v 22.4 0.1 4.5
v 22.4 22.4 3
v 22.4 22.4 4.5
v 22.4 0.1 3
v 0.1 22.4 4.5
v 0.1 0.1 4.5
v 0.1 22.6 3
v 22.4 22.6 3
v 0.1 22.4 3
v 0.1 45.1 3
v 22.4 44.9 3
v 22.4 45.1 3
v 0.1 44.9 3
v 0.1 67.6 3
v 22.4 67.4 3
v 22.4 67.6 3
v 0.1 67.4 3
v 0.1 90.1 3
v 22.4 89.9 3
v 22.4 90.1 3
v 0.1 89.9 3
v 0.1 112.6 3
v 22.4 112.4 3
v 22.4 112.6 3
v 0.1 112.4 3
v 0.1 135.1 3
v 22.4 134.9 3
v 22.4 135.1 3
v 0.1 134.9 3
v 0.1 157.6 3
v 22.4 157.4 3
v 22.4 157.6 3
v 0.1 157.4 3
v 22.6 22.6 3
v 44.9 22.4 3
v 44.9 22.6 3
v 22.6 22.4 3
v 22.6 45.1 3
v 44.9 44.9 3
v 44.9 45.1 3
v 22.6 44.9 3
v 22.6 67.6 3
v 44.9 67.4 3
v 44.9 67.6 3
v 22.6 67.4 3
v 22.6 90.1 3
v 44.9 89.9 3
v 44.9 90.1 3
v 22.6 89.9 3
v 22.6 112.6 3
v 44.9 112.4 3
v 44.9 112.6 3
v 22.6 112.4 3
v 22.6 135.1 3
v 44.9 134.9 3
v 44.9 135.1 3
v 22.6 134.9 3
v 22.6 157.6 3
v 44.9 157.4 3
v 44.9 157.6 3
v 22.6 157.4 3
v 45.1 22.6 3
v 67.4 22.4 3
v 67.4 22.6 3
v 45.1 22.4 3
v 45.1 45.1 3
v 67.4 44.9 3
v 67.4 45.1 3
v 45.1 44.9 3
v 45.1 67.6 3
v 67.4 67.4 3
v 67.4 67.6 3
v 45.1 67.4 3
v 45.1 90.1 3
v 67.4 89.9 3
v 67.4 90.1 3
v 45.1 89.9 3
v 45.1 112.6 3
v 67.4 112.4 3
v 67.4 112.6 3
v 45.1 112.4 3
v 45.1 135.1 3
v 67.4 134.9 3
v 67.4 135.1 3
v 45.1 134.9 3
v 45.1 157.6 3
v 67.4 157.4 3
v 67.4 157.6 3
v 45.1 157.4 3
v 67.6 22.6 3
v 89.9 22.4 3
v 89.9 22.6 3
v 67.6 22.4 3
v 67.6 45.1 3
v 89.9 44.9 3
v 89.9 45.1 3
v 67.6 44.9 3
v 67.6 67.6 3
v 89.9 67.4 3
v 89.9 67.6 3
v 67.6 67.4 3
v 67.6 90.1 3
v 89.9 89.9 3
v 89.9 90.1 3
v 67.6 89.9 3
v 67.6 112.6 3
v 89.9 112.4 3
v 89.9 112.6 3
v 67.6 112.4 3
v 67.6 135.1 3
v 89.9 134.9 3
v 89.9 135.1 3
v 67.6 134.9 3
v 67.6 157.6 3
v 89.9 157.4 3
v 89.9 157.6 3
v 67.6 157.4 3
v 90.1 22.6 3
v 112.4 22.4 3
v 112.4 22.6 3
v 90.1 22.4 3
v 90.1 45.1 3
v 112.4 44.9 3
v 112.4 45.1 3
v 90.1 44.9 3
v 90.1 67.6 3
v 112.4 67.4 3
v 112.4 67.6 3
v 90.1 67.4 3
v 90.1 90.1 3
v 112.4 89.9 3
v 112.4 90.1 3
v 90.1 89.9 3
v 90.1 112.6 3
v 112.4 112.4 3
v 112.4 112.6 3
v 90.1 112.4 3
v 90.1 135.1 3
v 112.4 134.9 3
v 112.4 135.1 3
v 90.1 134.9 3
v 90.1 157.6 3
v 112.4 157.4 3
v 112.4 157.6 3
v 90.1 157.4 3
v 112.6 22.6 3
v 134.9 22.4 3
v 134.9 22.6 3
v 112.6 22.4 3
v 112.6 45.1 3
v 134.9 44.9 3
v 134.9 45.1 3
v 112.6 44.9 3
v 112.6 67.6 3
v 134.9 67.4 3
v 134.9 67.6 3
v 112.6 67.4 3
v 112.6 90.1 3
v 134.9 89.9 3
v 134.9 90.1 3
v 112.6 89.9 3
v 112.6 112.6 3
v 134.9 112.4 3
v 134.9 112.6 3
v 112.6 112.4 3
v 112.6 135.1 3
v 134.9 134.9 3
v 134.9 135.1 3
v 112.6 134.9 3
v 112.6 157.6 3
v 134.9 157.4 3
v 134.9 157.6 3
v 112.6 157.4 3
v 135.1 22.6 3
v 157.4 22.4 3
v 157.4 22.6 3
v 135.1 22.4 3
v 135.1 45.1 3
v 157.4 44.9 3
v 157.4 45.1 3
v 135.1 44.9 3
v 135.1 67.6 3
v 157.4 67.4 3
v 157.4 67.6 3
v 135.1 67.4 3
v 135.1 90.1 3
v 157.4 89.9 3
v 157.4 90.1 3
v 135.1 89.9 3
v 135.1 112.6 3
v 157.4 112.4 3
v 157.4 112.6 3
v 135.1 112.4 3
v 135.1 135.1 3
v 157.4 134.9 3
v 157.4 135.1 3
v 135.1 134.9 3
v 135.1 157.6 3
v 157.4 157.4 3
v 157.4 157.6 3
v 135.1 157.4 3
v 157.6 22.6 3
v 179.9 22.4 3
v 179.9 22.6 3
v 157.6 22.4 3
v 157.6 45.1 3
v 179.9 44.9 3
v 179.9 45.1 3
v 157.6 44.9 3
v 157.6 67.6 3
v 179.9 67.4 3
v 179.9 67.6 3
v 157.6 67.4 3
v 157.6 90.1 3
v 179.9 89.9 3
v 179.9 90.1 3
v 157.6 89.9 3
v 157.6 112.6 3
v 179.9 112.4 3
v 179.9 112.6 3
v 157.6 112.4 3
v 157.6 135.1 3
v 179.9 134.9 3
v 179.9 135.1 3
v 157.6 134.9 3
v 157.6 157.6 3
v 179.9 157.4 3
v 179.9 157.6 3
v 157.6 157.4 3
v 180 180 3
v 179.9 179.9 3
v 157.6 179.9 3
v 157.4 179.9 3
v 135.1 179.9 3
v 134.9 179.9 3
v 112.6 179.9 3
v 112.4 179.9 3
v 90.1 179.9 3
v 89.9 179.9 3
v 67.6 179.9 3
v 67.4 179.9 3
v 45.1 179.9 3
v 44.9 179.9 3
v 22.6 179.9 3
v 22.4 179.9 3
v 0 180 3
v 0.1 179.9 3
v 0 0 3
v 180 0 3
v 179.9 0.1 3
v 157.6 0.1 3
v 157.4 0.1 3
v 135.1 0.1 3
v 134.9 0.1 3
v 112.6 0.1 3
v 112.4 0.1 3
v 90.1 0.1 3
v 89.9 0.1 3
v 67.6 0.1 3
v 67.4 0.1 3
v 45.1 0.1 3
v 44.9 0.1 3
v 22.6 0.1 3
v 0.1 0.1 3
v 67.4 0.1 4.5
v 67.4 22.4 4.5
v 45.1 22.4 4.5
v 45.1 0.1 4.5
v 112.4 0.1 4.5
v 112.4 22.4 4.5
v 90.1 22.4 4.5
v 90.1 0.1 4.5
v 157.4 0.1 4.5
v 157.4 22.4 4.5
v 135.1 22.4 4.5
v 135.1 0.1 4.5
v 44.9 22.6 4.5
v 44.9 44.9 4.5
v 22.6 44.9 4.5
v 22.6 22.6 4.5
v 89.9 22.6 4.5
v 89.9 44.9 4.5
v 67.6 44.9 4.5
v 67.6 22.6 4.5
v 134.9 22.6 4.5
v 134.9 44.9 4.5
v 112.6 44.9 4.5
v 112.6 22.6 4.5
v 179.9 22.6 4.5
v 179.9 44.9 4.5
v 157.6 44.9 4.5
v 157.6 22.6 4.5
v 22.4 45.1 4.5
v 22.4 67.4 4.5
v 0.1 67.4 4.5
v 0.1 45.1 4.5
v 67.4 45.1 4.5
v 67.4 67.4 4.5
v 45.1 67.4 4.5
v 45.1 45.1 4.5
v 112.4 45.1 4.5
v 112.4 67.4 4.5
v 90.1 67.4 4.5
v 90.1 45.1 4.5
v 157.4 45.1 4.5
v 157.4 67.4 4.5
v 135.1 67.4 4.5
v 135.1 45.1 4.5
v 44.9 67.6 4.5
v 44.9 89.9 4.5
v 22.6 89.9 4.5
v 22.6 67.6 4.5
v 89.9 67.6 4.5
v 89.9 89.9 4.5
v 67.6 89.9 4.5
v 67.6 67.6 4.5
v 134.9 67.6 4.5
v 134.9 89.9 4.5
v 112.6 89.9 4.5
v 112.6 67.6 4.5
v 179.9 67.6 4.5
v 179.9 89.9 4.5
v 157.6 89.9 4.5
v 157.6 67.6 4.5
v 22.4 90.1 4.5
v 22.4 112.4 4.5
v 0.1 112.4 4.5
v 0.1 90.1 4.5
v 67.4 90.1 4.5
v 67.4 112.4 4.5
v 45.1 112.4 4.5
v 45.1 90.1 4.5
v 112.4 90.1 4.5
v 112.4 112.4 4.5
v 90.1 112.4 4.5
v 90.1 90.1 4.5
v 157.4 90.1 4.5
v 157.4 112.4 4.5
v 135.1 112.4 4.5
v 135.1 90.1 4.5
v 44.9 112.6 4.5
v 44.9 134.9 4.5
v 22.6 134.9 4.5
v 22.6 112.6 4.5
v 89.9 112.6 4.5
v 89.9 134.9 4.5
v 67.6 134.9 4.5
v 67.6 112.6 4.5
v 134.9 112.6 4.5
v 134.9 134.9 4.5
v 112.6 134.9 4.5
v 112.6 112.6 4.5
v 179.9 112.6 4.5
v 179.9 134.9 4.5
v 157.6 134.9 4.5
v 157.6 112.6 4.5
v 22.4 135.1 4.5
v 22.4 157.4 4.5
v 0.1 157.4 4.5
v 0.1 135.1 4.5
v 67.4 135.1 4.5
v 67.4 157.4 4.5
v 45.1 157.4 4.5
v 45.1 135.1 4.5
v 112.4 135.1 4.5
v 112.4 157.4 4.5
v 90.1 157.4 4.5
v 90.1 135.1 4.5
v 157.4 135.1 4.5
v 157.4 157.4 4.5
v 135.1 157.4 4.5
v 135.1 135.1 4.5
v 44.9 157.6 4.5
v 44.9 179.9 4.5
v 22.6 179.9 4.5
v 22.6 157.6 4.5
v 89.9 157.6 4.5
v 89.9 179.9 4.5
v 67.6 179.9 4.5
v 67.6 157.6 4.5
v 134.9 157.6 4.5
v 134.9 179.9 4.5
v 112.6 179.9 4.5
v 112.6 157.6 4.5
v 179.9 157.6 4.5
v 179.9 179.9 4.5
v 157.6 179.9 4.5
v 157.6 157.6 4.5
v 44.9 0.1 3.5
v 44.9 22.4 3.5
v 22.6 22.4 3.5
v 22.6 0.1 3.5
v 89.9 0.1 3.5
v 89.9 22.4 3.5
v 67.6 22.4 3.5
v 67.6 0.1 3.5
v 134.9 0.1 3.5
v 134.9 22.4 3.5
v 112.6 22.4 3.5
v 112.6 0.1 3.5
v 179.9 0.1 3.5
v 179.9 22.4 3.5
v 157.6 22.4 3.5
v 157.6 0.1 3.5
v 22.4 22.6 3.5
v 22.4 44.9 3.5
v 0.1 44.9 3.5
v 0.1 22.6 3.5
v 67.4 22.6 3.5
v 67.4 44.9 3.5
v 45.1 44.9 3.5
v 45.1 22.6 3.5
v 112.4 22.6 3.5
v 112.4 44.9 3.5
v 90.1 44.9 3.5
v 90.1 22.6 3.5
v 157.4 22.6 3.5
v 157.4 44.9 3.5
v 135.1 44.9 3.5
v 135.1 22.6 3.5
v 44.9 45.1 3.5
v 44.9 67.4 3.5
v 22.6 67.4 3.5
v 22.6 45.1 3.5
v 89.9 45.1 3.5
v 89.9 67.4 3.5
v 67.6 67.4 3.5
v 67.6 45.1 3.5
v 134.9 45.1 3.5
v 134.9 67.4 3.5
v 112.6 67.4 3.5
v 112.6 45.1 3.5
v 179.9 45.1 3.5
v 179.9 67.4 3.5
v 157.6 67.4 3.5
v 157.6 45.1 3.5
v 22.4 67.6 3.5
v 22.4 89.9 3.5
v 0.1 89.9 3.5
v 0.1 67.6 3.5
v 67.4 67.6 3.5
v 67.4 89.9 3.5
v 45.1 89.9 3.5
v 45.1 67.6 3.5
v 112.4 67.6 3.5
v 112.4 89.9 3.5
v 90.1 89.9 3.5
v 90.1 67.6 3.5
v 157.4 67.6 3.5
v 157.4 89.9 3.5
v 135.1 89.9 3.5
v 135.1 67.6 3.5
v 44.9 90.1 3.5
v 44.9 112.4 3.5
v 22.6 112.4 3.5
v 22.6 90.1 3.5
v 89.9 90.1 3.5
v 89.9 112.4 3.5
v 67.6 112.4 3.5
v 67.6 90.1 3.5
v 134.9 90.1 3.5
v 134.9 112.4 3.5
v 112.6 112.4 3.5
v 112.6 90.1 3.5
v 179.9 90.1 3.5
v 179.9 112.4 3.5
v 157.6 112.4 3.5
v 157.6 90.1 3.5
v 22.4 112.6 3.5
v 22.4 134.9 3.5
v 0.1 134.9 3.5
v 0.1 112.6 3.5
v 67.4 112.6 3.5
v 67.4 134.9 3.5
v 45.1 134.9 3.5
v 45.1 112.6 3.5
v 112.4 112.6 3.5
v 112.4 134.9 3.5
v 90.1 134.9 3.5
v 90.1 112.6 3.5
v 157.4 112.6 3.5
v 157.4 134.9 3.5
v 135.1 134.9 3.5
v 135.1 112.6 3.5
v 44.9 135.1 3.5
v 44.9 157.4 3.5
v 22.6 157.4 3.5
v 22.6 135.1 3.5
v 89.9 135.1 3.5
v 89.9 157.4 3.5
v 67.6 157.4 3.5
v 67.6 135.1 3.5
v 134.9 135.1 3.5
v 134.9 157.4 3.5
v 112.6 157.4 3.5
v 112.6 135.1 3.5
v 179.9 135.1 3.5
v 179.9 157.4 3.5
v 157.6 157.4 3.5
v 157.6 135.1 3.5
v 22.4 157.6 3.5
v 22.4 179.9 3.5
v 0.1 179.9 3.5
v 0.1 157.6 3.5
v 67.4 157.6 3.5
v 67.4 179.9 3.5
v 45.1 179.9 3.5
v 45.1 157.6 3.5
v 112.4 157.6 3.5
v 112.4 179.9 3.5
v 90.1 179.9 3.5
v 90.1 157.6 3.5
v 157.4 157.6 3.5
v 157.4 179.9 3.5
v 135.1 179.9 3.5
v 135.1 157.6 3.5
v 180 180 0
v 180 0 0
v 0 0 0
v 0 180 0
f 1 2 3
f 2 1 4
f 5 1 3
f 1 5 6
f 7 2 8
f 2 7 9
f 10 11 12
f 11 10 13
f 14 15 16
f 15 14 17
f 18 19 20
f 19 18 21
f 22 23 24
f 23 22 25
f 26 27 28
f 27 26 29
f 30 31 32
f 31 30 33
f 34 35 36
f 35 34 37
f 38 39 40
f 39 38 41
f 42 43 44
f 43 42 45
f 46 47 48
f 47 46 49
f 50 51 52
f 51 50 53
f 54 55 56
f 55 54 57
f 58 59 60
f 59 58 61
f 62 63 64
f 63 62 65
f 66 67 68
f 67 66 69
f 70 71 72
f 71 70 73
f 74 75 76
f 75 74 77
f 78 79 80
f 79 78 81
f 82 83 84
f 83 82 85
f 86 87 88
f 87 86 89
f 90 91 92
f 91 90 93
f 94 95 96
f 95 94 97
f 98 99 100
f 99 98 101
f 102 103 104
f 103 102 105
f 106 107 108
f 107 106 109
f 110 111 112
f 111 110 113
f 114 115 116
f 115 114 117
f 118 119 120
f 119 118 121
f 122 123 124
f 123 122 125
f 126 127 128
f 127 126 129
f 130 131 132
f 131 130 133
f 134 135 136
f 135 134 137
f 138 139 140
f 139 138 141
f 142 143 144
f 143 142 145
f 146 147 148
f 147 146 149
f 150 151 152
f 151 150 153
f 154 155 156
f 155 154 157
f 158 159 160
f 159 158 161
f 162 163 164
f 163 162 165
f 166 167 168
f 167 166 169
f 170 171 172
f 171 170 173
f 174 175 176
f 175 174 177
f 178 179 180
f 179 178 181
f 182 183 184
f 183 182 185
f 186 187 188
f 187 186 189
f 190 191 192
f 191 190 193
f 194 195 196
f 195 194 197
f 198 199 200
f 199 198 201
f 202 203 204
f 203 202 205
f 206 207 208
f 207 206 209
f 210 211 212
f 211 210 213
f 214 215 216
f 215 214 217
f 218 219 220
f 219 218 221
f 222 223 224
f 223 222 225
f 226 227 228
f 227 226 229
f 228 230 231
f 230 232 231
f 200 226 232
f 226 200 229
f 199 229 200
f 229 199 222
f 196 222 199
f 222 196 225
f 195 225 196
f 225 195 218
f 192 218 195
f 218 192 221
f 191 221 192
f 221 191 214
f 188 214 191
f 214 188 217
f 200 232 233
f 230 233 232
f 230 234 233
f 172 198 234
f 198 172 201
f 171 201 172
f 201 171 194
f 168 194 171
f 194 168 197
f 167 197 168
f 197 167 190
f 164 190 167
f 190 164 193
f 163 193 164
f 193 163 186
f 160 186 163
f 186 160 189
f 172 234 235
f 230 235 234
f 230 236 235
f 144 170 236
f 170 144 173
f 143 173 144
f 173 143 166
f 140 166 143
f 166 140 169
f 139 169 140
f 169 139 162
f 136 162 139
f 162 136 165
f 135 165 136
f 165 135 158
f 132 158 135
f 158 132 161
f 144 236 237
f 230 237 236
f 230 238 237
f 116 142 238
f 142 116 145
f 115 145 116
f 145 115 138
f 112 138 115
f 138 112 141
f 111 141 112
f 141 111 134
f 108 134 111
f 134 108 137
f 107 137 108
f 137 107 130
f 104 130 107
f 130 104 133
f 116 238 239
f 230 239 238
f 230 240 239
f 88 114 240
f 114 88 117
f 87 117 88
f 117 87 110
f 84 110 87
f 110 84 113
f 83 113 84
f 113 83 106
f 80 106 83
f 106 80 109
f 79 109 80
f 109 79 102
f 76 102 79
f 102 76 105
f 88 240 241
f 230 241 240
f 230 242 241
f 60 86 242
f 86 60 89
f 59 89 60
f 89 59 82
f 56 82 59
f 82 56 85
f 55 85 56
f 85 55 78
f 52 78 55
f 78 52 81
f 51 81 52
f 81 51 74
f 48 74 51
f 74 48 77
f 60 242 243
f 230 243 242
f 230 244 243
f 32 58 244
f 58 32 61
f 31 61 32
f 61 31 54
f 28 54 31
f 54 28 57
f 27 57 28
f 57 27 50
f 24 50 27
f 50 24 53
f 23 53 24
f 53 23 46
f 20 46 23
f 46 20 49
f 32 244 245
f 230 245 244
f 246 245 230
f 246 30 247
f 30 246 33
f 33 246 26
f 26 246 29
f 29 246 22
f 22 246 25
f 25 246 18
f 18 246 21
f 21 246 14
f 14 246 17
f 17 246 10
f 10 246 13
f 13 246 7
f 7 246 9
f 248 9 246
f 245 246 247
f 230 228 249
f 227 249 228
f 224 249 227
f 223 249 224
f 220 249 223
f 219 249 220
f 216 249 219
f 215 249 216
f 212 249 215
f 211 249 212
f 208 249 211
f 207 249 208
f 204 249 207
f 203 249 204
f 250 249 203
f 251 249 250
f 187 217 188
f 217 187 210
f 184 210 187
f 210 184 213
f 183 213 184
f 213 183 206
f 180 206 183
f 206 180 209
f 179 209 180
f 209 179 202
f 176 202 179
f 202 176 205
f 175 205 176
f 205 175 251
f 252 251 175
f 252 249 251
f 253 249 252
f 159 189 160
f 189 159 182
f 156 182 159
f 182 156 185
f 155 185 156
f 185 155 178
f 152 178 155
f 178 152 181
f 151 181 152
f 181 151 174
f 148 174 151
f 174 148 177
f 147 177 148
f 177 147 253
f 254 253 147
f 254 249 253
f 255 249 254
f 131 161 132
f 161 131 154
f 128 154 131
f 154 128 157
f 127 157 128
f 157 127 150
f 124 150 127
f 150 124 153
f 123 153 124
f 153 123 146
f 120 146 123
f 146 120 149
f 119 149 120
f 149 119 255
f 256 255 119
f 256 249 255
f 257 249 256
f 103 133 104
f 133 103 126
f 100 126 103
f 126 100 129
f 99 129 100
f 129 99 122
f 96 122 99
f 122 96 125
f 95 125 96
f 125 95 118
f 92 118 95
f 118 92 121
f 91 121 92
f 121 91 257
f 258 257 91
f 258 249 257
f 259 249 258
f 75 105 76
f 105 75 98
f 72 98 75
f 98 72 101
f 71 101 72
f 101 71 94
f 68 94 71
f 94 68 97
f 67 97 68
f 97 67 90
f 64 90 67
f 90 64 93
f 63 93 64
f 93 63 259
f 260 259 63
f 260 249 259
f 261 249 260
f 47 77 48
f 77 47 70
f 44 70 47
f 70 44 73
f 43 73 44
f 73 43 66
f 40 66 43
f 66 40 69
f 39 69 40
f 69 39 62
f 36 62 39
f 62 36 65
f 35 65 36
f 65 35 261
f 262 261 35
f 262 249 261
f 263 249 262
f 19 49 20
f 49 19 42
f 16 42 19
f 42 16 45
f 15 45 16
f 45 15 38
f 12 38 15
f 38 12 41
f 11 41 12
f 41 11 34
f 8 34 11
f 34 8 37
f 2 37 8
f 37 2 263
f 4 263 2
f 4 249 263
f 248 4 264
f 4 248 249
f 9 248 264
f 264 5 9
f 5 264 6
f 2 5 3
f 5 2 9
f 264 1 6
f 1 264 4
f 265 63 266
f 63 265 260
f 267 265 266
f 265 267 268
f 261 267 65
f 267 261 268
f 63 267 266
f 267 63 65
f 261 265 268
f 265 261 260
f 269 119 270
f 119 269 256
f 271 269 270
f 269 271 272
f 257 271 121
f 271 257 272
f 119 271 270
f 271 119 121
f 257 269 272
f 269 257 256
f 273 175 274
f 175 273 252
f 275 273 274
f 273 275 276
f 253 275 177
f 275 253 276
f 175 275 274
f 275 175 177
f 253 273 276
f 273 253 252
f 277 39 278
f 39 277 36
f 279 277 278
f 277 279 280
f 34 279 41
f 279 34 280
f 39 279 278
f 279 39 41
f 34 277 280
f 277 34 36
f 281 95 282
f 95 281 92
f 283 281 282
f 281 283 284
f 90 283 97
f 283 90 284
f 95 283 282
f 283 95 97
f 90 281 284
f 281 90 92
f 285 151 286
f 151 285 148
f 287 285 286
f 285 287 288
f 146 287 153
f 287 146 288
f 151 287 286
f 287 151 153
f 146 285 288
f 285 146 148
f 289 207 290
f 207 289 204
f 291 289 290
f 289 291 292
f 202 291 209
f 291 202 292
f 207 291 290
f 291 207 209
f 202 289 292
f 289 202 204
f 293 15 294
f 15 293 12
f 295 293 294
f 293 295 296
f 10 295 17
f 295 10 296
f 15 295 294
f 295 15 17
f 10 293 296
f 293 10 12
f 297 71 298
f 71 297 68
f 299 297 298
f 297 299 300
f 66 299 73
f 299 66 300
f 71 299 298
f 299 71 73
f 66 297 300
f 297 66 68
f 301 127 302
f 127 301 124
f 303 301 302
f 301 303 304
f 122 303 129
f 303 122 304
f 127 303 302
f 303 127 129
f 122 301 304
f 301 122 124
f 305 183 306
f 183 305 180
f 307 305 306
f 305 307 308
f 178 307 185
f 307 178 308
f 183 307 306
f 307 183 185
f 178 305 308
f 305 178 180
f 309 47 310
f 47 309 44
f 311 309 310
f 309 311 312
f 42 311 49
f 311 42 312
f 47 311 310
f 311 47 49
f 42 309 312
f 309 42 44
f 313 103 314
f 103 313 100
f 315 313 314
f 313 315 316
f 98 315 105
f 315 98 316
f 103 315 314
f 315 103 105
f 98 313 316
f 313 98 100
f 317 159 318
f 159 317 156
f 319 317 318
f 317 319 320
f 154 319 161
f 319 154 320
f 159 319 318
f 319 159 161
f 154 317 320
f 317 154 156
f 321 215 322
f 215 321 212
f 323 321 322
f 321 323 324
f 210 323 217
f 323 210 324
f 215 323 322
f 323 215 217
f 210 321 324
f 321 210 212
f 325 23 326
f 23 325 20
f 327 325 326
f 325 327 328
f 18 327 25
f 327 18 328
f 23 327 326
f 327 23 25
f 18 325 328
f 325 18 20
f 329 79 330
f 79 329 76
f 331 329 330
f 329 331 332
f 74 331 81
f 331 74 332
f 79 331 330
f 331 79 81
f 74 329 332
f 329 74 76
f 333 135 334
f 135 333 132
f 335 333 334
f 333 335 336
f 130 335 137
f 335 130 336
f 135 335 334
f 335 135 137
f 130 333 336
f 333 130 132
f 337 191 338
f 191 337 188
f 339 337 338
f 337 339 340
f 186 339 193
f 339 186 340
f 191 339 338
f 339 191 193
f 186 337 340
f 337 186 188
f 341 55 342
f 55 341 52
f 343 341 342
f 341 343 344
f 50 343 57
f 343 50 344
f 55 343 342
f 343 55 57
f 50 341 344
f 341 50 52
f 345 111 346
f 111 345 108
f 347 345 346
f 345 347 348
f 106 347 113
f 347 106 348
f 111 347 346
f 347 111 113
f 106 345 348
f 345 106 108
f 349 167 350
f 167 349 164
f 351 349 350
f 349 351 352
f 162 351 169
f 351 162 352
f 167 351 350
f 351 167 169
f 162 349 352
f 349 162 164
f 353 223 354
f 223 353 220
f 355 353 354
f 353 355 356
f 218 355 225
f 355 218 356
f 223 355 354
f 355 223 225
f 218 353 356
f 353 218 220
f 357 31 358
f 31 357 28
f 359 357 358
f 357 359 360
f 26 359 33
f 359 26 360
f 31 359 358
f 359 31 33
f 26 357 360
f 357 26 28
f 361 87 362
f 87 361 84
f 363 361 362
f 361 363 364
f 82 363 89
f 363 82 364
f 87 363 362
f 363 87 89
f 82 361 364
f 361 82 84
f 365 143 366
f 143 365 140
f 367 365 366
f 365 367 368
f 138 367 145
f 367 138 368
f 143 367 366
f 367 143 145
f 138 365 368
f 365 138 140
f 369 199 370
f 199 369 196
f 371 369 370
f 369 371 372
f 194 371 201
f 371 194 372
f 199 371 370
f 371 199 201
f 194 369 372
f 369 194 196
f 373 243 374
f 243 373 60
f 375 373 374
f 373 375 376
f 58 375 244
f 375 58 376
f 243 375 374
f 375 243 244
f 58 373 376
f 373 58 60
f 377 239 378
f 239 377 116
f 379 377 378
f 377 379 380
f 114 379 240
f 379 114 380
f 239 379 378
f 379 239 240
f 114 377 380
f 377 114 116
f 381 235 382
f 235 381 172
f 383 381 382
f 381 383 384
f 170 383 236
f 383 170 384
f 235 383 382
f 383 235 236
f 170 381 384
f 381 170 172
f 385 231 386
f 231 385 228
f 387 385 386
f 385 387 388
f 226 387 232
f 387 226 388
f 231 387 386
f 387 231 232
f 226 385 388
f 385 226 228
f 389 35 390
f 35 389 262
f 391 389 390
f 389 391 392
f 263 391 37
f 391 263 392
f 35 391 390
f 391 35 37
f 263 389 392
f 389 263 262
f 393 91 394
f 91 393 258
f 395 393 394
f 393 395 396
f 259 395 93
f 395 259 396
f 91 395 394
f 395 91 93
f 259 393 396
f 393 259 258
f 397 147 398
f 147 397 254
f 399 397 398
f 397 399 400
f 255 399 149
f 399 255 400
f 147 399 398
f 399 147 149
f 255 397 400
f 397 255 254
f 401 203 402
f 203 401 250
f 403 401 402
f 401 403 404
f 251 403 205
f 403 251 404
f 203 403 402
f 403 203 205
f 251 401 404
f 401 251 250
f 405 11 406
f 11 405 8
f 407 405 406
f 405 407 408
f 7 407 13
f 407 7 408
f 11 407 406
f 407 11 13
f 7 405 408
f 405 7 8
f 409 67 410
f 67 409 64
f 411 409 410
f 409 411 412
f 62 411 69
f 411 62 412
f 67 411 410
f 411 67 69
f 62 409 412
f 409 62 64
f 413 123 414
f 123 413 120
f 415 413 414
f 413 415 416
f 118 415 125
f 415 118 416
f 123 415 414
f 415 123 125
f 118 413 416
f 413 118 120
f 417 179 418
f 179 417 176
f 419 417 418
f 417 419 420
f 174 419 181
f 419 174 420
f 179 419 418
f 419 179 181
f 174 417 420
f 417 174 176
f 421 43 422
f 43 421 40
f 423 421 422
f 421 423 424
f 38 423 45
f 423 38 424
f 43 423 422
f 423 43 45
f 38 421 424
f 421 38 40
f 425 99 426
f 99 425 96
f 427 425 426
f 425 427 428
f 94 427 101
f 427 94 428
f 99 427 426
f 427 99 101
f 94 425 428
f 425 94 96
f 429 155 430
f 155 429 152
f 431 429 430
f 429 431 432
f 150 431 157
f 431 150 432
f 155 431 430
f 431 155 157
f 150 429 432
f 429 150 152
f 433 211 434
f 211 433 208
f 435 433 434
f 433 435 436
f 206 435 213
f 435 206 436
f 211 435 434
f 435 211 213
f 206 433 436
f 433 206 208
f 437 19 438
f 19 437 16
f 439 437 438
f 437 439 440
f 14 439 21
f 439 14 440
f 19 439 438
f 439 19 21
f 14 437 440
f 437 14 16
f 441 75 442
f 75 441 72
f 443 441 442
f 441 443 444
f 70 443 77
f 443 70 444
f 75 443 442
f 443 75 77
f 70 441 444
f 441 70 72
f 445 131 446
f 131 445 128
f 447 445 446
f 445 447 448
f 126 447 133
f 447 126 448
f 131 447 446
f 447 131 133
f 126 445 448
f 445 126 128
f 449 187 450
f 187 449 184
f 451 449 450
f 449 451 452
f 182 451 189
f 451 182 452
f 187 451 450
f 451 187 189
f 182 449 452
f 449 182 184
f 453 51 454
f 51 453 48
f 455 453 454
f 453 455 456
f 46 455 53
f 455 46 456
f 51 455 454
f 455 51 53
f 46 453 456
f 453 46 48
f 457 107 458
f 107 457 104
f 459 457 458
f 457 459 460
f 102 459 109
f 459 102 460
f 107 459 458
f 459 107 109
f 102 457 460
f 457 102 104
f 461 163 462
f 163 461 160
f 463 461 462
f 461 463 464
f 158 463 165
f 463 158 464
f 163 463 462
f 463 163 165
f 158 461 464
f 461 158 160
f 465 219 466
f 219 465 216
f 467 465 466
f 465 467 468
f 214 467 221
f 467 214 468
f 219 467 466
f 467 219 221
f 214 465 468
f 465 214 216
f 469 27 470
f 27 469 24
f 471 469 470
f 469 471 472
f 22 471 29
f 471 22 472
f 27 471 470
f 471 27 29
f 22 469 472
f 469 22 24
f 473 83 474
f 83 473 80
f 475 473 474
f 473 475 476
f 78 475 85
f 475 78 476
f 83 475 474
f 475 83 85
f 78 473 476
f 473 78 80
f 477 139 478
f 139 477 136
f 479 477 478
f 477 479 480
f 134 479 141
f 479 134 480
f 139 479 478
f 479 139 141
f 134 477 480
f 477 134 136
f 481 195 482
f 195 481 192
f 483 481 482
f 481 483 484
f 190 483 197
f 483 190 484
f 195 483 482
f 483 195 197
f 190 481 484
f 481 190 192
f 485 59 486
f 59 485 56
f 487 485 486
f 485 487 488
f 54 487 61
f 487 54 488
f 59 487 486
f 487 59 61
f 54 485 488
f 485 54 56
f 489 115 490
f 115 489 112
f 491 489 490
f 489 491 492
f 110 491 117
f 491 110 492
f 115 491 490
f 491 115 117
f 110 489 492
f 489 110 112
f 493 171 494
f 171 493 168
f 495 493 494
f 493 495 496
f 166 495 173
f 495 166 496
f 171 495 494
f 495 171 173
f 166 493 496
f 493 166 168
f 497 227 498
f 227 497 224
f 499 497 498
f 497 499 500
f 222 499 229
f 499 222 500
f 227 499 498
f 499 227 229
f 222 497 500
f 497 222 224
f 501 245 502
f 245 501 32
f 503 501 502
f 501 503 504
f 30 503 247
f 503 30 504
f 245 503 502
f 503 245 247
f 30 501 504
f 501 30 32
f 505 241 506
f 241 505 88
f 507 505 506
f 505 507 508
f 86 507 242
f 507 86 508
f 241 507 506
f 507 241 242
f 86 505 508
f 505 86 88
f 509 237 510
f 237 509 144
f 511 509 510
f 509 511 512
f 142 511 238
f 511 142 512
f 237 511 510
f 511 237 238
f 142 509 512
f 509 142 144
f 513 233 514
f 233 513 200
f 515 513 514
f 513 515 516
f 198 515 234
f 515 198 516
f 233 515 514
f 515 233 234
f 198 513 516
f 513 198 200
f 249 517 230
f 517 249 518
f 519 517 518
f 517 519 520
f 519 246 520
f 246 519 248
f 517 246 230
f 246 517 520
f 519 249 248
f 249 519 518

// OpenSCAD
// Параметры
board_size = 180;
cells = 8;
cell_size = board_size / cells;
base_thickness = 3;
white_height = 1.5;
black_height = 0.5;
gap = 0.2;

// Белые клетки
color("white")
for (row = [0:cells-1], col = [0:cells-1]) {
    if ((row + col) % 2 == 0) {
        translate([col*cell_size + gap/2, row*cell_size + gap/2, base_thickness])
            cube([cell_size-gap, cell_size-gap, white_height]);
    }
}

// Чёрные клетки
color("black")
for (row = [0:cells-1], col = [0:cells-1]) {
    if ((row + col) % 2 == 1) {
        translate([col*cell_size + gap/2, row*cell_size + gap/2, base_thickness])
            cube([cell_size-gap, cell_size-gap, black_height]);
    }
}

// Основание
color("black")
translate([0, 0, 0])
    cube([board_size, board_size, base_thickness]);
